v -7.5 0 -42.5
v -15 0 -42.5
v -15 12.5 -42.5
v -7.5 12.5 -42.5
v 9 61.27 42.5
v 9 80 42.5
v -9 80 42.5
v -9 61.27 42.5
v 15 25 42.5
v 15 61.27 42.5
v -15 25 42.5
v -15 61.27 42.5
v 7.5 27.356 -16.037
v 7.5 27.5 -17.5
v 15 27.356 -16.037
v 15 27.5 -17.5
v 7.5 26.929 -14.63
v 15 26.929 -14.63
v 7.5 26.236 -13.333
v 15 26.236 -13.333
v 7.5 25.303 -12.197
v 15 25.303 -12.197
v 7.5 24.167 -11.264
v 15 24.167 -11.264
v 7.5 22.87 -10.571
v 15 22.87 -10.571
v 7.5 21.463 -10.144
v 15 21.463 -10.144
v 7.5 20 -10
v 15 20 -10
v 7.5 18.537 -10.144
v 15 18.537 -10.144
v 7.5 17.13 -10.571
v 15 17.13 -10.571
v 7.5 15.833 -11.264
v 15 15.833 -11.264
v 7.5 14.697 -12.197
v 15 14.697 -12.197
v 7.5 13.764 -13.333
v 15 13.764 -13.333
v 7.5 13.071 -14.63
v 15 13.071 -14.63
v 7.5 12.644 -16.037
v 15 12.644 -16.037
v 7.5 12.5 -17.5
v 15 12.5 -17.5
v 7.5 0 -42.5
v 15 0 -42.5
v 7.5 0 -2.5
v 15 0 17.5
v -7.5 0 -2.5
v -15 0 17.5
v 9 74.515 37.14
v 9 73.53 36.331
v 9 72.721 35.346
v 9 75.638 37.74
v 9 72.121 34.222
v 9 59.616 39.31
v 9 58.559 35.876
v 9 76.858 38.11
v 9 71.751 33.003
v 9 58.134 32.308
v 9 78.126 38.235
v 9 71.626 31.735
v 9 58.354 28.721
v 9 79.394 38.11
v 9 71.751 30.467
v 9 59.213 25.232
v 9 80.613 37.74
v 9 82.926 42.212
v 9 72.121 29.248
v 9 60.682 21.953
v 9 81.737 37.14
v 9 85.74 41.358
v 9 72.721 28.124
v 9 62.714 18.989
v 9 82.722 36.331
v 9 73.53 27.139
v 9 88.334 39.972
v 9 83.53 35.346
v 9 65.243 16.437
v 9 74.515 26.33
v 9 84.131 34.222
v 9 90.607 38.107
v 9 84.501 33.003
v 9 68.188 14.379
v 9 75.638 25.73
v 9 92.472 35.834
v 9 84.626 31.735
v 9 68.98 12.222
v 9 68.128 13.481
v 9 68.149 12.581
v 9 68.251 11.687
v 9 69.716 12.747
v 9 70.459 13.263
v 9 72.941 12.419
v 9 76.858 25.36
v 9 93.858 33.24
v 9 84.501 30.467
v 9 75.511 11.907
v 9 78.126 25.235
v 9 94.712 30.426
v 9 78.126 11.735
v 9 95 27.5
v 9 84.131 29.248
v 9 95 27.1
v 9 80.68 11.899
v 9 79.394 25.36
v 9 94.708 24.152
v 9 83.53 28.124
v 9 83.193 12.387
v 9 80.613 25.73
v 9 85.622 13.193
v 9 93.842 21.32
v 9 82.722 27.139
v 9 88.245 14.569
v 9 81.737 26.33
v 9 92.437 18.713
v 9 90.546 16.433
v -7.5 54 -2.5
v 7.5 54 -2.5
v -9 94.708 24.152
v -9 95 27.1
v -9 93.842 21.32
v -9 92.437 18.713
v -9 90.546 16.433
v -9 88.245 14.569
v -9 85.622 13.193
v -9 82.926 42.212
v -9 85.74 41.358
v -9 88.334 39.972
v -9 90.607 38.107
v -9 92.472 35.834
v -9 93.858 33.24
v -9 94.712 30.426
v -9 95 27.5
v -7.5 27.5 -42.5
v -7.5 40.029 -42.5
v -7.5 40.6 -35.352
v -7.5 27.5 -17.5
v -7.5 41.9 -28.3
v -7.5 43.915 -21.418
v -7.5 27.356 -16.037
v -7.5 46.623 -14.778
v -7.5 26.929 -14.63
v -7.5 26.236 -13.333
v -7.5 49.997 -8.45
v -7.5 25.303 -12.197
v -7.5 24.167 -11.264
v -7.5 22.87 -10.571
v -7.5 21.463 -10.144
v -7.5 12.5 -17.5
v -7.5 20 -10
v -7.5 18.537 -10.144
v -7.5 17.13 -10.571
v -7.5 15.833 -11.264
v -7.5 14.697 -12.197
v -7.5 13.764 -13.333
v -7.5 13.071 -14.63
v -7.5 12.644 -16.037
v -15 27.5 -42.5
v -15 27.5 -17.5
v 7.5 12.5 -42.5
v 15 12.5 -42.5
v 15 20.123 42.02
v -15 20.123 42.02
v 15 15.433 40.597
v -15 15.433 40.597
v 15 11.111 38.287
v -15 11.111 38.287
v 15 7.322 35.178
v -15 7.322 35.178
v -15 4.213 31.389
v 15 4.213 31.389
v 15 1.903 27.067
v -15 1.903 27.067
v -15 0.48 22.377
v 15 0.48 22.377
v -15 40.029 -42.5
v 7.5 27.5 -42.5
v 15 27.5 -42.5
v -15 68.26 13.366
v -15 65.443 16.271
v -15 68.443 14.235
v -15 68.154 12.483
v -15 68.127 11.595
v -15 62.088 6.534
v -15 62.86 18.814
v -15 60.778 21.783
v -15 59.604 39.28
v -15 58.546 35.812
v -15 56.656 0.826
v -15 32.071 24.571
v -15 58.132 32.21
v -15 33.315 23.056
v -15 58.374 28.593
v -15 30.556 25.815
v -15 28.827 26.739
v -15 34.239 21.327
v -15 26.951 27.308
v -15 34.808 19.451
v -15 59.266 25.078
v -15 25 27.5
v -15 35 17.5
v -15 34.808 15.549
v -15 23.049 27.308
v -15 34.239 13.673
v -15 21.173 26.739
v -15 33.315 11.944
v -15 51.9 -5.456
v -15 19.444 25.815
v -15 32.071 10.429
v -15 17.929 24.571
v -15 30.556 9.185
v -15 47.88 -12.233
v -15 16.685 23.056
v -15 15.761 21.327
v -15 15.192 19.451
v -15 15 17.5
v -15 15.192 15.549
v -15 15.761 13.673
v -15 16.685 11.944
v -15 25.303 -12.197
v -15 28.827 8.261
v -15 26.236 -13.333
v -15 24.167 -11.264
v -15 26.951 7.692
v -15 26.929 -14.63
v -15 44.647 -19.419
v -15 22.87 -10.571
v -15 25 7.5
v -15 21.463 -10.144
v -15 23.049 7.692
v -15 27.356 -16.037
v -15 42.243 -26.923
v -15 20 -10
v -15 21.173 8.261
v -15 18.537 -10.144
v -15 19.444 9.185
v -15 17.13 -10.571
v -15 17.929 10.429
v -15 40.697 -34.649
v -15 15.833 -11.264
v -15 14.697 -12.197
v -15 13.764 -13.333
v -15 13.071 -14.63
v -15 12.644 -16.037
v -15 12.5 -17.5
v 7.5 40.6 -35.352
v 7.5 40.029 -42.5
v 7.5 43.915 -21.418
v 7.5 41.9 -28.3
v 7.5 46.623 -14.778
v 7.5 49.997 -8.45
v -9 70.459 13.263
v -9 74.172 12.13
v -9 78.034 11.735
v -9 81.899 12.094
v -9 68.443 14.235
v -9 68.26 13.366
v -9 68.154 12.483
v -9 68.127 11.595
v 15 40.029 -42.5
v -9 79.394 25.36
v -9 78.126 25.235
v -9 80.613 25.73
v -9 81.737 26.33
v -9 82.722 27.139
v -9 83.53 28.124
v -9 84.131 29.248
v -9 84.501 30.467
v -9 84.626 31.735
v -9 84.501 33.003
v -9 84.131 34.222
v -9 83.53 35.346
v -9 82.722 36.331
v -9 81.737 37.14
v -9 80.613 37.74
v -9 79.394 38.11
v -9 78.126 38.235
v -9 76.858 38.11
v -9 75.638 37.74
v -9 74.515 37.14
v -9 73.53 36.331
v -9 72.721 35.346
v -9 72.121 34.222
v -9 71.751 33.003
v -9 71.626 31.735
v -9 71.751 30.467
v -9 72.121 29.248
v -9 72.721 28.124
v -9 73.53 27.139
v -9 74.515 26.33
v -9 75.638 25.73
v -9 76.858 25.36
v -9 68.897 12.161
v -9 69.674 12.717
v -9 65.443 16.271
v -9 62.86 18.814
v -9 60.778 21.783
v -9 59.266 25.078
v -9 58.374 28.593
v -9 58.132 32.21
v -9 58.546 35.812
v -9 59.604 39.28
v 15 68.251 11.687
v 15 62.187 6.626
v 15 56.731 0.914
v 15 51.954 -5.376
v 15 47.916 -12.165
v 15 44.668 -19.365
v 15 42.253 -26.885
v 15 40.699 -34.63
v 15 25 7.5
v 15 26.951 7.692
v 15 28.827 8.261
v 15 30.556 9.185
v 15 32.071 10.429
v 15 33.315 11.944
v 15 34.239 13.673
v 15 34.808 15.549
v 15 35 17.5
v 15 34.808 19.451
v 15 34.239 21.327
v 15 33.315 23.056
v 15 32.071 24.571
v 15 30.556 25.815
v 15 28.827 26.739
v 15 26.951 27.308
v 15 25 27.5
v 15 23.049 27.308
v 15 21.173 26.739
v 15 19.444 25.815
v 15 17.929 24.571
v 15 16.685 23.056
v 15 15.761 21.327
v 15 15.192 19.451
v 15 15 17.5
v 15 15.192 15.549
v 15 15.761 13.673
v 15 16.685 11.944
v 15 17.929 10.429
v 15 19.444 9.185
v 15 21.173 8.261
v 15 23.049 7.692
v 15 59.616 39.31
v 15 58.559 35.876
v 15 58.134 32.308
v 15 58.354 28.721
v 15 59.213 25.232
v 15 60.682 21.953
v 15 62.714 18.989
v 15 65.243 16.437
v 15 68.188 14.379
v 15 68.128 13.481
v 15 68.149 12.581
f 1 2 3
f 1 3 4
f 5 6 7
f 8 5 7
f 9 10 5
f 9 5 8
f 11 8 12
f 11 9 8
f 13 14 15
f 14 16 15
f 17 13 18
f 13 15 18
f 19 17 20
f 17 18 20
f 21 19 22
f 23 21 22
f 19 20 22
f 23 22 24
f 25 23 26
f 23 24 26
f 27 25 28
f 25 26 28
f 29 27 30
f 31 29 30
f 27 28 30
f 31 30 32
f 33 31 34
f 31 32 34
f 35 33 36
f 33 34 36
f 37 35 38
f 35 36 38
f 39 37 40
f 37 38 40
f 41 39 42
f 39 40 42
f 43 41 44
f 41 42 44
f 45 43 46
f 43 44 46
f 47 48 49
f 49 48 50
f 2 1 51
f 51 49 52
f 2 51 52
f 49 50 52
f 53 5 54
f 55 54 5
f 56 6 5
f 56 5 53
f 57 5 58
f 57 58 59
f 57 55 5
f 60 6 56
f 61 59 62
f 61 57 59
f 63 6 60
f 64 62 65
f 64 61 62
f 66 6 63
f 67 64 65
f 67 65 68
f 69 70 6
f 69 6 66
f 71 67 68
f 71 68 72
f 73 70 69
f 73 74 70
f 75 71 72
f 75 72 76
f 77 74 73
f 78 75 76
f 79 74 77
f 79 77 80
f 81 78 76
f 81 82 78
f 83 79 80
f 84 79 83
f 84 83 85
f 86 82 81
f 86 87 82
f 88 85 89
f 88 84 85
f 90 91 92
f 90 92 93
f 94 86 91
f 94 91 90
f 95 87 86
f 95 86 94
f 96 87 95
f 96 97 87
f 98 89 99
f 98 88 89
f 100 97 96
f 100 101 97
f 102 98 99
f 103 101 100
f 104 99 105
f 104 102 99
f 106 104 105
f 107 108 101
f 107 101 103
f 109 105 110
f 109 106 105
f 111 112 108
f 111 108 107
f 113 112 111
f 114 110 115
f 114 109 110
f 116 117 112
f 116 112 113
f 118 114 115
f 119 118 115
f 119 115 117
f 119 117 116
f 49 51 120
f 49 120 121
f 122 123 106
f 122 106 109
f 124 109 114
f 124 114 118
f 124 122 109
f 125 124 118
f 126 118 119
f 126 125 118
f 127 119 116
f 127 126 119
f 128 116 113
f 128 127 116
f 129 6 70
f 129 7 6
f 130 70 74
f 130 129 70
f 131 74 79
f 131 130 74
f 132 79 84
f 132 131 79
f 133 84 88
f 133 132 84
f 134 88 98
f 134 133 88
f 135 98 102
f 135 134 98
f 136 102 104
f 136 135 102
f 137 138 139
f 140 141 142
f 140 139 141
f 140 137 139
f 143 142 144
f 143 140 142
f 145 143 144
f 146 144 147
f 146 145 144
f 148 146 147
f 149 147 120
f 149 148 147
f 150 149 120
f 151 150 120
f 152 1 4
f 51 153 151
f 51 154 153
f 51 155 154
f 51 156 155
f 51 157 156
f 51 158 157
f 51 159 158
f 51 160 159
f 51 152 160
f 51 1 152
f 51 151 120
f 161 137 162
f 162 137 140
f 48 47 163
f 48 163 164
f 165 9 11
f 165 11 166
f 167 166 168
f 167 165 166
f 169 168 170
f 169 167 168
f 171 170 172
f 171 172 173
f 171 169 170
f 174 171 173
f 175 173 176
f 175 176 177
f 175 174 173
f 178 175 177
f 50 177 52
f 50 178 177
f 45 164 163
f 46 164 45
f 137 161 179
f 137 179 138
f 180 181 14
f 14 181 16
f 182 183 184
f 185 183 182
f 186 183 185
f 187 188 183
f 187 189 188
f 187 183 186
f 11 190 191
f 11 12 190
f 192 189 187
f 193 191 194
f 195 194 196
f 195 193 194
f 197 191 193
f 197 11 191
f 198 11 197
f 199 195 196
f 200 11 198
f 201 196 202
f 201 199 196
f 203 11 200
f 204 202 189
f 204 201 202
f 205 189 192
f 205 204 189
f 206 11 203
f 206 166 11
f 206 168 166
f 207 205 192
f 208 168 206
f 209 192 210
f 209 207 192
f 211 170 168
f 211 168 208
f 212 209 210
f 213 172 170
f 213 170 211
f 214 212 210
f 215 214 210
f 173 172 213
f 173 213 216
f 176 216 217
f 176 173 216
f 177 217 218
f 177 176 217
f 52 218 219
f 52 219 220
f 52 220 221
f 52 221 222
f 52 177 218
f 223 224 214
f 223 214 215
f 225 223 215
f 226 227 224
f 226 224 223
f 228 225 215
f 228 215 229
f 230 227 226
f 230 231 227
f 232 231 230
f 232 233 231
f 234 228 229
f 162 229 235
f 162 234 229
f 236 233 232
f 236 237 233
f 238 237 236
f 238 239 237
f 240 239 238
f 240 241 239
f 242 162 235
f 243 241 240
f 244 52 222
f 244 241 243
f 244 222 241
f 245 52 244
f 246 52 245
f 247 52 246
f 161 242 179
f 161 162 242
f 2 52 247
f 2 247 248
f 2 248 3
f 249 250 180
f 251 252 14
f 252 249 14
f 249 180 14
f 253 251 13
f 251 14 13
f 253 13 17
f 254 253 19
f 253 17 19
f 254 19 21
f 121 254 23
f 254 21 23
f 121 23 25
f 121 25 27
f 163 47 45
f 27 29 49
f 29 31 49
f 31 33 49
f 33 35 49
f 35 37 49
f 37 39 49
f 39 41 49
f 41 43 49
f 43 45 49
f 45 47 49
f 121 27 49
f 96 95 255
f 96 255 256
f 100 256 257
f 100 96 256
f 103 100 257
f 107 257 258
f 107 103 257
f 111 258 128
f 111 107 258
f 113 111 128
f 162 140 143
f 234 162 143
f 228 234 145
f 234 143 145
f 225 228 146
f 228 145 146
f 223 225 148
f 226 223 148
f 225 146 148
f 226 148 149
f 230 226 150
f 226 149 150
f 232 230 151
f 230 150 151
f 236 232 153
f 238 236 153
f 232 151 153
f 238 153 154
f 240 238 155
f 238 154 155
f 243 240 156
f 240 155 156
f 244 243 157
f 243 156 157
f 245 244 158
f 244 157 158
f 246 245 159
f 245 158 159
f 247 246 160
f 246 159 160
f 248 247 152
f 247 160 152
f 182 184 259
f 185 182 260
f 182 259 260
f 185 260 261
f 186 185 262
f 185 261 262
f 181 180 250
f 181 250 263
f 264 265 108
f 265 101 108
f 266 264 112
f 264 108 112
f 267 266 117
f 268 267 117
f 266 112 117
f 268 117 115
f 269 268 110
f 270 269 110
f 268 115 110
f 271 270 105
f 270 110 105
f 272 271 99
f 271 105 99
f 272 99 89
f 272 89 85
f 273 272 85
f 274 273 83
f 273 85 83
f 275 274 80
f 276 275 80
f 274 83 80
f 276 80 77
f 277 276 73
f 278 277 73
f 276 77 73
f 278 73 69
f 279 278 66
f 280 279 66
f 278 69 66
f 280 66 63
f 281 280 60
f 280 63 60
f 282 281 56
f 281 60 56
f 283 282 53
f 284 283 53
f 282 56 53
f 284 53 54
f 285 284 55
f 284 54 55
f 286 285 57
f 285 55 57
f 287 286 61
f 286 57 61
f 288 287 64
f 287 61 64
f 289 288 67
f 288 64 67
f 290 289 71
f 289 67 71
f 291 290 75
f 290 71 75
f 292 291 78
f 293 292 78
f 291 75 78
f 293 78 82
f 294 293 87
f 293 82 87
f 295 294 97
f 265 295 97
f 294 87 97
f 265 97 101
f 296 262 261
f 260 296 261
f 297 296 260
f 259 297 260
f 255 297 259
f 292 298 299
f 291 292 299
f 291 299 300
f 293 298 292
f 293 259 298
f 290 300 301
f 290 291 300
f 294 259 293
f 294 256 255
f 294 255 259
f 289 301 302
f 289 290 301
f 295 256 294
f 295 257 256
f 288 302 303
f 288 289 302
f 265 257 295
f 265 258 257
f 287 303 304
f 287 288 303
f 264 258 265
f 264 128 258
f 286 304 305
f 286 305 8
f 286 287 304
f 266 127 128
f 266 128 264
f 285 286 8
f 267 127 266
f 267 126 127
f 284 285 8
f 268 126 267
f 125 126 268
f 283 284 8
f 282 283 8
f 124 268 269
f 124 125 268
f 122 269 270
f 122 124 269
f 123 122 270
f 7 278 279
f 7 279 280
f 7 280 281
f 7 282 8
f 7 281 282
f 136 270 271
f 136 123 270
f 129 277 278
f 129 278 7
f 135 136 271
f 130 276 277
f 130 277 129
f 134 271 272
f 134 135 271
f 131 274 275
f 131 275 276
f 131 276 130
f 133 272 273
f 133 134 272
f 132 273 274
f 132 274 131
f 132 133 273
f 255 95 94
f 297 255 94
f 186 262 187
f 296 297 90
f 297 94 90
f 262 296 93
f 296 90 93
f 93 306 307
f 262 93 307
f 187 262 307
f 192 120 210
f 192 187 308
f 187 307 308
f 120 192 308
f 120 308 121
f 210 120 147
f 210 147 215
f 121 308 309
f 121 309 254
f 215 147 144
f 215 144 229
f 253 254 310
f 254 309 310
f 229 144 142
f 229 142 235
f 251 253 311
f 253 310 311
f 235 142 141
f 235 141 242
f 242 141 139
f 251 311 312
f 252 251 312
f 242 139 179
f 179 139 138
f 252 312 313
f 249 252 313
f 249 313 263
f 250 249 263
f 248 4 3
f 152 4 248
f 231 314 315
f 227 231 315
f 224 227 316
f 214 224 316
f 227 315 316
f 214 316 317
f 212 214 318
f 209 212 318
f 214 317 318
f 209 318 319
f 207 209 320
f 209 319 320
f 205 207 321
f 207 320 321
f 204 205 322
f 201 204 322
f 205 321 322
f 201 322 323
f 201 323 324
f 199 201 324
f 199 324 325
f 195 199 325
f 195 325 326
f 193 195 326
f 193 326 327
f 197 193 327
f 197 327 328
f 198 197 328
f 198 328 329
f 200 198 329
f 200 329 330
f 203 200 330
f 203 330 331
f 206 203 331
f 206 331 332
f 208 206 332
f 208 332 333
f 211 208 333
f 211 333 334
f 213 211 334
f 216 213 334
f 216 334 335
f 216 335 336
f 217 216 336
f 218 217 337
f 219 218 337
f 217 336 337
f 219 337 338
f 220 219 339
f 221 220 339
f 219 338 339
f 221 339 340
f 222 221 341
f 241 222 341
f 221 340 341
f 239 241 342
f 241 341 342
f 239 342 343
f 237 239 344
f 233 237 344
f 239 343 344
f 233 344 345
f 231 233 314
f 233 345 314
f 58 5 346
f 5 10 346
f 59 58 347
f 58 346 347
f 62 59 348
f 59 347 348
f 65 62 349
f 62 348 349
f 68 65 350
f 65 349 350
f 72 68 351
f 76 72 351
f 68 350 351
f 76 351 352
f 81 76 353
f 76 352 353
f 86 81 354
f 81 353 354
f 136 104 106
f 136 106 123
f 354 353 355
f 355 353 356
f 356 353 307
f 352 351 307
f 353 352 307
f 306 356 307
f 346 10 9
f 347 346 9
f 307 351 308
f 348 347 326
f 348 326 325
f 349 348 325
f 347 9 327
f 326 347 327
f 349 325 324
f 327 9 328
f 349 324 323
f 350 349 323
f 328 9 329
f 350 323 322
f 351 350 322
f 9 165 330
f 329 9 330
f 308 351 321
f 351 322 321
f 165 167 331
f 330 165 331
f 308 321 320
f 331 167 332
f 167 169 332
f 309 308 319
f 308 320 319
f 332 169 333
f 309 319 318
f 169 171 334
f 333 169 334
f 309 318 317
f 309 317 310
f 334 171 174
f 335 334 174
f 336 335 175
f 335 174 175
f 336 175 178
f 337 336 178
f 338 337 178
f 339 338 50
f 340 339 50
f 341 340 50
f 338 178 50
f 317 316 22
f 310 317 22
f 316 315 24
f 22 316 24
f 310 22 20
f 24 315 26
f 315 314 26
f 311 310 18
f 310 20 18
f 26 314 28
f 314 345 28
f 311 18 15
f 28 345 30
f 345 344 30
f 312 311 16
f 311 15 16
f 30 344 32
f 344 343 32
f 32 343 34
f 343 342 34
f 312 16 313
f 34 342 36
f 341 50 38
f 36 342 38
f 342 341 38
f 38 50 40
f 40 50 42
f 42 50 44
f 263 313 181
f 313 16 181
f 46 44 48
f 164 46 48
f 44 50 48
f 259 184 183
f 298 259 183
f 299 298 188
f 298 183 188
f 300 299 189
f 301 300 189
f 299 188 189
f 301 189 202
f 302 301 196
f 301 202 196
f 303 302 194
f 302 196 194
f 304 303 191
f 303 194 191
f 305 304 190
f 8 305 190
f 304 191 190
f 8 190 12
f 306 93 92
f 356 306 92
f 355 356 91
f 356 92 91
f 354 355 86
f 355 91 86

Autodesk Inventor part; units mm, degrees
ref_plane "YZ Plane" through (0, 0, 0) normal (1, 0, 0) x (0, 1, 0)
ref_plane "XZ Plane" through (0, 0, 0) normal (0, 1, 0) x (-1, 0, 0)
ref_plane "XY Plane" through (0, 0, 0) normal (0, 0, 1) x (1, 0, 0)
sketch "Sketch1" plane through (0, 0, 0) normal (0, 1, 0) x (-1, 0, 0)
  line L0 (0, 42.5) -> (0, -42.5)
  line L1 (15, 0) -> (-15, 0)
  line L2 (0, 42.5) -> (15, 42.5)
  line L3 (15, 42.5) -> (15, -42.5)
  line L4 (15, -42.5) -> (-15, -42.5)
  line L5 (0, 42.5) -> (-15, 42.5)
  line L6 (-15, 42.5) -> (-15, -42.5)
  point P0 (0, 0)
  point P1 (0, 0)
  point P2 (0, 0)
extrude "Extrusion1" add sketch "Sketch1" along normal blind 95
fillet "Fillet1" radius 25 1 edges at (-7.5, 0, 42.5)
sketch "Sketch2" plane through (15, 0, -42.5) normal (1, 0, 0) x (0, 0, -1)
  arc A0 (-85, 25) -> (-60, 0) centre (-60, 25) ccw projected
  line L0 (-60, 0) -> (0, 0) projected
  line L1 (0, 0) -> (0, 95) projected
  line L2 (-85, 95) -> (0, 95) projected
  line L3 (-85, 25) -> (-85, 95) projected
  circle A1 centre (-60, 25) radius 10
  line L4 (0, 0) -> (0, 12.5)
  line L5 (0, 0) -> (0, 95) projected
  line L6 (0, 12.5) -> (-25, 12.5)
  line L7 (0, 12.5) -> (0, 27.5)
  line L8 (0, 27.5) -> (0, 40)
  line L9 (0, 40) -> (-40, 40)
  line L10 (0, 27.5) -> (-25, 27.5)
  arc A2 (-25, 27.5) -> (-25, 12.5) centre (-25, 20) ccw
  point P0 (-42.5, 0)
  dimension "d5" = 20
  dimension "d6" = 12.5
  dimension "d7" = 25
  dimension "d8" = 15
  dimension "d9" = 12.5
  dimension "d10" = 40
extrude "Extrusion2" cut sketch "Sketch2" against normal up to next contours L6 A2 L10 L1 | A1
sketch "Sketch3" plane through (15, 95, 42.5) normal (1, 0, 0) x (0, 0, -1)
  line L0 (85, -82.5) -> (60, -82.5) projected
  arc A0 (60, -67.5) -> (60, -82.5) centre (60, -75) ccw projected
  line L1 (60, -67.5) -> (85, -67.5) projected
  line L2 (85, -67.5) -> (85, 0) projected
  line L3 (0, 0) -> (85, 0) projected
  line L4 (0, -70) -> (0, 0) projected
  arc A1 (0, -70) -> (25, -95) centre (25, -70) ccw projected
  line L5 (25, -95) -> (85, -95) projected
  line L6 (85, -95) -> (85, -82.5) projected
  circle A2 centre (25, -70) radius 10 projected
  line L7 (25, -70) -> (25, 29)
  line L8 (25, -70) -> (-1.9532, 30.5909)
  line L9 (25, -70) -> (10.765, -16.8741)
  circle A3 centre (10.765, -16.8741) radius 6.5
  circle A4 centre (10.765, -16.8741) radius 20
  line L10 (0, 0) -> (85, 0) projected
  line L11 (85, 0) -> (0, 0) projected
  point P0 (42.5, -95)
  dimension "d13" = 15
  dimension "d14" = 55
  dimension "d15" = 13
  dimension "d17" = 40
extrude "Extrusion3" cut sketch "Sketch3" against normal up to next contours A3 L8 | L8 A3
extrude "Extrusion4" cut sketch "Sketch3" against normal blind 6 contours A4 L4 | L4 A4 L3 L8 A3 | L8 A3 L3 A4 L7 | L3 L8 A4 | A4 L7 | A4 L8 L3
fillet "Fillet2" radius 15 1 edges at (0, 95, 42.5)
sketch "Sketch5" plane through (15, 0, -42.5) normal (0, 0, -1) x (-1, 0, 0)
  line L0 (30, 12.5) -> (0, 12.5) projected
  line L1 (0, 0) -> (0, 12.5) projected
  line L2 (0, 0) -> (30, 0) projected
  line L3 (30, 0) -> (30, 12.5) projected
  line L4 (0, 0) -> (7.5, 0)
  line L5 (7.5, 0) -> (7.5, 40)
  line L6 (7.5, 40) -> (22.5, 40)
  line L7 (22.5, 40) -> (22.5, 0)
  point P0 (15, 0)
  dimension "d28" = 7.5
  dimension "d29" = 40
  dimension "d30" = 15
extrude "Extrusion6" cut sketch "Sketch5" against normal blind 40 contours L7 L2 L5 L0 | L0 L5 L6 L7
sketch "Sketch6" plane through (15, 0, 17.5) normal (1, 0, 0) x (0, 0, -1)
  arc A0 (-25, 61.2702) -> (-3.4989, 95) centre (-14.235, 78.1259) ccw projected
  line L0 (-25, 25) -> (-25, 61.2702) projected
  arc A1 (-25, 25) -> (0, 0) centre (0, 25) ccw projected
  line L1 (0, 0) -> (60, 0) projected
  line L2 (60, 0) -> (60, 12.5) projected
  line L3 (60, 12.5) -> (35, 12.5) projected
  arc A2 (35, 27.5) -> (35, 12.5) centre (35, 20) ccw projected
  line L4 (35, 27.5) -> (60, 27.5) projected
  line L5 (60, 27.5) -> (60, 95) projected
  line L6 (-3.4989, 95) -> (60, 95) projected
  circle A3 centre (0, 25) radius 10 projected
  line L7 (-14.235, 78.1259) -> (5.765, 78.1259)
  line L8 (60, 40) -> (60, 27.5) projected
  line L9 (60, 0) -> (60, 40)
  line L10 (60, 40) -> (20, 40) projected
  line L11 (60, 40) -> (20, 40)
  line L12 (20, 40) -> (20, 54)
  circle A4 centre (62, 110) radius 70
  point P0 (17.5, 0)
  point P1 (4.2372, 70.4594)
  point P2 (60, 40.0286)
  dimension "d33" = 140
extrude "Extrusion7" cut sketch "Sketch6" against normal up to next contours A0 L6 L5 A4
sketch "Sketch7" plane through (-15, 0, -42.5) normal (-1, 0, 0) x (0, 0, 1)
  circle A0 centre (60, 25) radius 10 projected
  circle A1 centre (74.235, 78.1259) radius 6.5 projected
  arc A2 (0, 40.0286) -> (55.7628, 70.4594) centre (-2, 110) ccw projected
  line L0 (0, 27.5) -> (0, 40.0286) projected
  line L1 (0, 27.5) -> (25, 27.5) projected
  arc A3 (25, 12.5) -> (25, 27.5) centre (25, 20) ccw projected
  line L2 (25, 12.5) -> (0, 12.5) projected
  line L3 (0, 0) -> (0, 12.5) projected
  line L4 (0, 0) -> (60, 0) projected
  arc A4 (60, 0) -> (85, 25) centre (60, 25) ccw projected
  line L5 (85, 25) -> (85, 80) projected
  arc A5 (85, 80) -> (70, 95) centre (70, 80) ccw projected
  line L6 (63.4989, 95) -> (70, 95) projected
  circle A6 centre (74.235, 78.1259) radius 20
  arc A7 (63.4989, 95) -> (55.7628, 70.4594) centre (74.235, 78.1259) ccw projected
  point P0 (42.5, 0)
  dimension "d36" = 40
extrude "Extrusion8" cut sketch "Sketch7" against normal blind 6 contours A1 | A6 L6 A5 L5 | A6 L5 A5 L6
fillet "Fillet3" radius 15 1 edges at (0, 95, 20.9989)
sketch "Sketch8" plane through (-7.5, 40, -42.5) normal (0, -1, 0) x (1, 0, 0)
  line L0 (0, 0) -> (0, 40) projected
  line L1 (0, 40) -> (15, 40)
  line L2 (15, 0) -> (15, 40) projected
  line L3 (15, 40) -> (15, 0)
  line L4 (15, 0) -> (0, 0)
  line L5 (0, 0) -> (0, 40)
  point P0 (7.5, 42.5)
extrude "Extrusion9" cut sketch "Sketch8" against normal up to next
sketch "Sketch9" plane through (9, 95, 42.5) normal (1, 0, 0) x (0, 0, -1)
  circle A0 centre (25, -70) radius 10 projected
  arc A1 (29.2372, -24.5406) -> (85, -54.9714) centre (87, 15) ccw projected
  arc A2 (0, -33.7298) -> (29.2372, -24.5406) centre (10.765, -16.8741) ccw projected
  line L0 (0, -70) -> (0, -33.7298) projected
  arc A3 (0, -70) -> (25, -95) centre (25, -70) ccw projected
  line L1 (25, -95) -> (85, -95) projected
  line L2 (85, -95) -> (85, -82.5) projected
  line L3 (85, -82.5) -> (60, -82.5) projected
  arc A4 (60, -67.5) -> (60, -82.5) centre (60, -75) ccw projected
  line L4 (60, -67.5) -> (85, -67.5) projected
  line L5 (85, -67.5) -> (85, -54.9714) projected
  line L6 (10.765, -16.8741) -> (29.2372, -16.8741)
  circle A5 centre (29.2372, -16.8741) radius 10
  point P0 (42.5, -95)
  dimension "d42" = 20
extrude "Extrusion10" cut sketch "Sketch9" along normal blind 10 contours A2 A5 A1 | A1 A5 A2
sketch "Sketch10" plane through (-9, 0, -42.5) normal (-1, 0, 0) x (0, 0, 1)
  circle A0 centre (74.235, 78.1259) radius 6.5 projected
  arc A1 (69.5996, 95) -> (55.6931, 85.6222) centre (69.5996, 80) ccw projected
  arc A2 (55.6931, 85.6222) -> (55.7628, 70.4594) centre (74.235, 78.1259) ccw projected
  arc A3 (55.7628, 70.4594) -> (85, 61.2702) centre (74.235, 78.1259) ccw projected
  line L0 (85, 80) -> (85, 61.2702) projected
  arc A4 (85, 80) -> (70, 95) centre (70, 80) ccw projected
  line L1 (69.5996, 95) -> (70, 95) projected
  line L2 (74.235, 78.1259) -> (42.5, 78.1259)
  circle A5 centre (54.235, 78.1259) radius 10
  point P0 (42.5, 0)
  dimension "d45" = 20
extrude "Extrusion11" cut sketch "Sketch10" along normal blind 10 contours A5 A3 A2 L2 | L2 A2 A1 A5 | L2 A5 A1 A2 | A2 A3 A5 L2
properties part number "FIGURA3_U3_MINIPROYECTO"
